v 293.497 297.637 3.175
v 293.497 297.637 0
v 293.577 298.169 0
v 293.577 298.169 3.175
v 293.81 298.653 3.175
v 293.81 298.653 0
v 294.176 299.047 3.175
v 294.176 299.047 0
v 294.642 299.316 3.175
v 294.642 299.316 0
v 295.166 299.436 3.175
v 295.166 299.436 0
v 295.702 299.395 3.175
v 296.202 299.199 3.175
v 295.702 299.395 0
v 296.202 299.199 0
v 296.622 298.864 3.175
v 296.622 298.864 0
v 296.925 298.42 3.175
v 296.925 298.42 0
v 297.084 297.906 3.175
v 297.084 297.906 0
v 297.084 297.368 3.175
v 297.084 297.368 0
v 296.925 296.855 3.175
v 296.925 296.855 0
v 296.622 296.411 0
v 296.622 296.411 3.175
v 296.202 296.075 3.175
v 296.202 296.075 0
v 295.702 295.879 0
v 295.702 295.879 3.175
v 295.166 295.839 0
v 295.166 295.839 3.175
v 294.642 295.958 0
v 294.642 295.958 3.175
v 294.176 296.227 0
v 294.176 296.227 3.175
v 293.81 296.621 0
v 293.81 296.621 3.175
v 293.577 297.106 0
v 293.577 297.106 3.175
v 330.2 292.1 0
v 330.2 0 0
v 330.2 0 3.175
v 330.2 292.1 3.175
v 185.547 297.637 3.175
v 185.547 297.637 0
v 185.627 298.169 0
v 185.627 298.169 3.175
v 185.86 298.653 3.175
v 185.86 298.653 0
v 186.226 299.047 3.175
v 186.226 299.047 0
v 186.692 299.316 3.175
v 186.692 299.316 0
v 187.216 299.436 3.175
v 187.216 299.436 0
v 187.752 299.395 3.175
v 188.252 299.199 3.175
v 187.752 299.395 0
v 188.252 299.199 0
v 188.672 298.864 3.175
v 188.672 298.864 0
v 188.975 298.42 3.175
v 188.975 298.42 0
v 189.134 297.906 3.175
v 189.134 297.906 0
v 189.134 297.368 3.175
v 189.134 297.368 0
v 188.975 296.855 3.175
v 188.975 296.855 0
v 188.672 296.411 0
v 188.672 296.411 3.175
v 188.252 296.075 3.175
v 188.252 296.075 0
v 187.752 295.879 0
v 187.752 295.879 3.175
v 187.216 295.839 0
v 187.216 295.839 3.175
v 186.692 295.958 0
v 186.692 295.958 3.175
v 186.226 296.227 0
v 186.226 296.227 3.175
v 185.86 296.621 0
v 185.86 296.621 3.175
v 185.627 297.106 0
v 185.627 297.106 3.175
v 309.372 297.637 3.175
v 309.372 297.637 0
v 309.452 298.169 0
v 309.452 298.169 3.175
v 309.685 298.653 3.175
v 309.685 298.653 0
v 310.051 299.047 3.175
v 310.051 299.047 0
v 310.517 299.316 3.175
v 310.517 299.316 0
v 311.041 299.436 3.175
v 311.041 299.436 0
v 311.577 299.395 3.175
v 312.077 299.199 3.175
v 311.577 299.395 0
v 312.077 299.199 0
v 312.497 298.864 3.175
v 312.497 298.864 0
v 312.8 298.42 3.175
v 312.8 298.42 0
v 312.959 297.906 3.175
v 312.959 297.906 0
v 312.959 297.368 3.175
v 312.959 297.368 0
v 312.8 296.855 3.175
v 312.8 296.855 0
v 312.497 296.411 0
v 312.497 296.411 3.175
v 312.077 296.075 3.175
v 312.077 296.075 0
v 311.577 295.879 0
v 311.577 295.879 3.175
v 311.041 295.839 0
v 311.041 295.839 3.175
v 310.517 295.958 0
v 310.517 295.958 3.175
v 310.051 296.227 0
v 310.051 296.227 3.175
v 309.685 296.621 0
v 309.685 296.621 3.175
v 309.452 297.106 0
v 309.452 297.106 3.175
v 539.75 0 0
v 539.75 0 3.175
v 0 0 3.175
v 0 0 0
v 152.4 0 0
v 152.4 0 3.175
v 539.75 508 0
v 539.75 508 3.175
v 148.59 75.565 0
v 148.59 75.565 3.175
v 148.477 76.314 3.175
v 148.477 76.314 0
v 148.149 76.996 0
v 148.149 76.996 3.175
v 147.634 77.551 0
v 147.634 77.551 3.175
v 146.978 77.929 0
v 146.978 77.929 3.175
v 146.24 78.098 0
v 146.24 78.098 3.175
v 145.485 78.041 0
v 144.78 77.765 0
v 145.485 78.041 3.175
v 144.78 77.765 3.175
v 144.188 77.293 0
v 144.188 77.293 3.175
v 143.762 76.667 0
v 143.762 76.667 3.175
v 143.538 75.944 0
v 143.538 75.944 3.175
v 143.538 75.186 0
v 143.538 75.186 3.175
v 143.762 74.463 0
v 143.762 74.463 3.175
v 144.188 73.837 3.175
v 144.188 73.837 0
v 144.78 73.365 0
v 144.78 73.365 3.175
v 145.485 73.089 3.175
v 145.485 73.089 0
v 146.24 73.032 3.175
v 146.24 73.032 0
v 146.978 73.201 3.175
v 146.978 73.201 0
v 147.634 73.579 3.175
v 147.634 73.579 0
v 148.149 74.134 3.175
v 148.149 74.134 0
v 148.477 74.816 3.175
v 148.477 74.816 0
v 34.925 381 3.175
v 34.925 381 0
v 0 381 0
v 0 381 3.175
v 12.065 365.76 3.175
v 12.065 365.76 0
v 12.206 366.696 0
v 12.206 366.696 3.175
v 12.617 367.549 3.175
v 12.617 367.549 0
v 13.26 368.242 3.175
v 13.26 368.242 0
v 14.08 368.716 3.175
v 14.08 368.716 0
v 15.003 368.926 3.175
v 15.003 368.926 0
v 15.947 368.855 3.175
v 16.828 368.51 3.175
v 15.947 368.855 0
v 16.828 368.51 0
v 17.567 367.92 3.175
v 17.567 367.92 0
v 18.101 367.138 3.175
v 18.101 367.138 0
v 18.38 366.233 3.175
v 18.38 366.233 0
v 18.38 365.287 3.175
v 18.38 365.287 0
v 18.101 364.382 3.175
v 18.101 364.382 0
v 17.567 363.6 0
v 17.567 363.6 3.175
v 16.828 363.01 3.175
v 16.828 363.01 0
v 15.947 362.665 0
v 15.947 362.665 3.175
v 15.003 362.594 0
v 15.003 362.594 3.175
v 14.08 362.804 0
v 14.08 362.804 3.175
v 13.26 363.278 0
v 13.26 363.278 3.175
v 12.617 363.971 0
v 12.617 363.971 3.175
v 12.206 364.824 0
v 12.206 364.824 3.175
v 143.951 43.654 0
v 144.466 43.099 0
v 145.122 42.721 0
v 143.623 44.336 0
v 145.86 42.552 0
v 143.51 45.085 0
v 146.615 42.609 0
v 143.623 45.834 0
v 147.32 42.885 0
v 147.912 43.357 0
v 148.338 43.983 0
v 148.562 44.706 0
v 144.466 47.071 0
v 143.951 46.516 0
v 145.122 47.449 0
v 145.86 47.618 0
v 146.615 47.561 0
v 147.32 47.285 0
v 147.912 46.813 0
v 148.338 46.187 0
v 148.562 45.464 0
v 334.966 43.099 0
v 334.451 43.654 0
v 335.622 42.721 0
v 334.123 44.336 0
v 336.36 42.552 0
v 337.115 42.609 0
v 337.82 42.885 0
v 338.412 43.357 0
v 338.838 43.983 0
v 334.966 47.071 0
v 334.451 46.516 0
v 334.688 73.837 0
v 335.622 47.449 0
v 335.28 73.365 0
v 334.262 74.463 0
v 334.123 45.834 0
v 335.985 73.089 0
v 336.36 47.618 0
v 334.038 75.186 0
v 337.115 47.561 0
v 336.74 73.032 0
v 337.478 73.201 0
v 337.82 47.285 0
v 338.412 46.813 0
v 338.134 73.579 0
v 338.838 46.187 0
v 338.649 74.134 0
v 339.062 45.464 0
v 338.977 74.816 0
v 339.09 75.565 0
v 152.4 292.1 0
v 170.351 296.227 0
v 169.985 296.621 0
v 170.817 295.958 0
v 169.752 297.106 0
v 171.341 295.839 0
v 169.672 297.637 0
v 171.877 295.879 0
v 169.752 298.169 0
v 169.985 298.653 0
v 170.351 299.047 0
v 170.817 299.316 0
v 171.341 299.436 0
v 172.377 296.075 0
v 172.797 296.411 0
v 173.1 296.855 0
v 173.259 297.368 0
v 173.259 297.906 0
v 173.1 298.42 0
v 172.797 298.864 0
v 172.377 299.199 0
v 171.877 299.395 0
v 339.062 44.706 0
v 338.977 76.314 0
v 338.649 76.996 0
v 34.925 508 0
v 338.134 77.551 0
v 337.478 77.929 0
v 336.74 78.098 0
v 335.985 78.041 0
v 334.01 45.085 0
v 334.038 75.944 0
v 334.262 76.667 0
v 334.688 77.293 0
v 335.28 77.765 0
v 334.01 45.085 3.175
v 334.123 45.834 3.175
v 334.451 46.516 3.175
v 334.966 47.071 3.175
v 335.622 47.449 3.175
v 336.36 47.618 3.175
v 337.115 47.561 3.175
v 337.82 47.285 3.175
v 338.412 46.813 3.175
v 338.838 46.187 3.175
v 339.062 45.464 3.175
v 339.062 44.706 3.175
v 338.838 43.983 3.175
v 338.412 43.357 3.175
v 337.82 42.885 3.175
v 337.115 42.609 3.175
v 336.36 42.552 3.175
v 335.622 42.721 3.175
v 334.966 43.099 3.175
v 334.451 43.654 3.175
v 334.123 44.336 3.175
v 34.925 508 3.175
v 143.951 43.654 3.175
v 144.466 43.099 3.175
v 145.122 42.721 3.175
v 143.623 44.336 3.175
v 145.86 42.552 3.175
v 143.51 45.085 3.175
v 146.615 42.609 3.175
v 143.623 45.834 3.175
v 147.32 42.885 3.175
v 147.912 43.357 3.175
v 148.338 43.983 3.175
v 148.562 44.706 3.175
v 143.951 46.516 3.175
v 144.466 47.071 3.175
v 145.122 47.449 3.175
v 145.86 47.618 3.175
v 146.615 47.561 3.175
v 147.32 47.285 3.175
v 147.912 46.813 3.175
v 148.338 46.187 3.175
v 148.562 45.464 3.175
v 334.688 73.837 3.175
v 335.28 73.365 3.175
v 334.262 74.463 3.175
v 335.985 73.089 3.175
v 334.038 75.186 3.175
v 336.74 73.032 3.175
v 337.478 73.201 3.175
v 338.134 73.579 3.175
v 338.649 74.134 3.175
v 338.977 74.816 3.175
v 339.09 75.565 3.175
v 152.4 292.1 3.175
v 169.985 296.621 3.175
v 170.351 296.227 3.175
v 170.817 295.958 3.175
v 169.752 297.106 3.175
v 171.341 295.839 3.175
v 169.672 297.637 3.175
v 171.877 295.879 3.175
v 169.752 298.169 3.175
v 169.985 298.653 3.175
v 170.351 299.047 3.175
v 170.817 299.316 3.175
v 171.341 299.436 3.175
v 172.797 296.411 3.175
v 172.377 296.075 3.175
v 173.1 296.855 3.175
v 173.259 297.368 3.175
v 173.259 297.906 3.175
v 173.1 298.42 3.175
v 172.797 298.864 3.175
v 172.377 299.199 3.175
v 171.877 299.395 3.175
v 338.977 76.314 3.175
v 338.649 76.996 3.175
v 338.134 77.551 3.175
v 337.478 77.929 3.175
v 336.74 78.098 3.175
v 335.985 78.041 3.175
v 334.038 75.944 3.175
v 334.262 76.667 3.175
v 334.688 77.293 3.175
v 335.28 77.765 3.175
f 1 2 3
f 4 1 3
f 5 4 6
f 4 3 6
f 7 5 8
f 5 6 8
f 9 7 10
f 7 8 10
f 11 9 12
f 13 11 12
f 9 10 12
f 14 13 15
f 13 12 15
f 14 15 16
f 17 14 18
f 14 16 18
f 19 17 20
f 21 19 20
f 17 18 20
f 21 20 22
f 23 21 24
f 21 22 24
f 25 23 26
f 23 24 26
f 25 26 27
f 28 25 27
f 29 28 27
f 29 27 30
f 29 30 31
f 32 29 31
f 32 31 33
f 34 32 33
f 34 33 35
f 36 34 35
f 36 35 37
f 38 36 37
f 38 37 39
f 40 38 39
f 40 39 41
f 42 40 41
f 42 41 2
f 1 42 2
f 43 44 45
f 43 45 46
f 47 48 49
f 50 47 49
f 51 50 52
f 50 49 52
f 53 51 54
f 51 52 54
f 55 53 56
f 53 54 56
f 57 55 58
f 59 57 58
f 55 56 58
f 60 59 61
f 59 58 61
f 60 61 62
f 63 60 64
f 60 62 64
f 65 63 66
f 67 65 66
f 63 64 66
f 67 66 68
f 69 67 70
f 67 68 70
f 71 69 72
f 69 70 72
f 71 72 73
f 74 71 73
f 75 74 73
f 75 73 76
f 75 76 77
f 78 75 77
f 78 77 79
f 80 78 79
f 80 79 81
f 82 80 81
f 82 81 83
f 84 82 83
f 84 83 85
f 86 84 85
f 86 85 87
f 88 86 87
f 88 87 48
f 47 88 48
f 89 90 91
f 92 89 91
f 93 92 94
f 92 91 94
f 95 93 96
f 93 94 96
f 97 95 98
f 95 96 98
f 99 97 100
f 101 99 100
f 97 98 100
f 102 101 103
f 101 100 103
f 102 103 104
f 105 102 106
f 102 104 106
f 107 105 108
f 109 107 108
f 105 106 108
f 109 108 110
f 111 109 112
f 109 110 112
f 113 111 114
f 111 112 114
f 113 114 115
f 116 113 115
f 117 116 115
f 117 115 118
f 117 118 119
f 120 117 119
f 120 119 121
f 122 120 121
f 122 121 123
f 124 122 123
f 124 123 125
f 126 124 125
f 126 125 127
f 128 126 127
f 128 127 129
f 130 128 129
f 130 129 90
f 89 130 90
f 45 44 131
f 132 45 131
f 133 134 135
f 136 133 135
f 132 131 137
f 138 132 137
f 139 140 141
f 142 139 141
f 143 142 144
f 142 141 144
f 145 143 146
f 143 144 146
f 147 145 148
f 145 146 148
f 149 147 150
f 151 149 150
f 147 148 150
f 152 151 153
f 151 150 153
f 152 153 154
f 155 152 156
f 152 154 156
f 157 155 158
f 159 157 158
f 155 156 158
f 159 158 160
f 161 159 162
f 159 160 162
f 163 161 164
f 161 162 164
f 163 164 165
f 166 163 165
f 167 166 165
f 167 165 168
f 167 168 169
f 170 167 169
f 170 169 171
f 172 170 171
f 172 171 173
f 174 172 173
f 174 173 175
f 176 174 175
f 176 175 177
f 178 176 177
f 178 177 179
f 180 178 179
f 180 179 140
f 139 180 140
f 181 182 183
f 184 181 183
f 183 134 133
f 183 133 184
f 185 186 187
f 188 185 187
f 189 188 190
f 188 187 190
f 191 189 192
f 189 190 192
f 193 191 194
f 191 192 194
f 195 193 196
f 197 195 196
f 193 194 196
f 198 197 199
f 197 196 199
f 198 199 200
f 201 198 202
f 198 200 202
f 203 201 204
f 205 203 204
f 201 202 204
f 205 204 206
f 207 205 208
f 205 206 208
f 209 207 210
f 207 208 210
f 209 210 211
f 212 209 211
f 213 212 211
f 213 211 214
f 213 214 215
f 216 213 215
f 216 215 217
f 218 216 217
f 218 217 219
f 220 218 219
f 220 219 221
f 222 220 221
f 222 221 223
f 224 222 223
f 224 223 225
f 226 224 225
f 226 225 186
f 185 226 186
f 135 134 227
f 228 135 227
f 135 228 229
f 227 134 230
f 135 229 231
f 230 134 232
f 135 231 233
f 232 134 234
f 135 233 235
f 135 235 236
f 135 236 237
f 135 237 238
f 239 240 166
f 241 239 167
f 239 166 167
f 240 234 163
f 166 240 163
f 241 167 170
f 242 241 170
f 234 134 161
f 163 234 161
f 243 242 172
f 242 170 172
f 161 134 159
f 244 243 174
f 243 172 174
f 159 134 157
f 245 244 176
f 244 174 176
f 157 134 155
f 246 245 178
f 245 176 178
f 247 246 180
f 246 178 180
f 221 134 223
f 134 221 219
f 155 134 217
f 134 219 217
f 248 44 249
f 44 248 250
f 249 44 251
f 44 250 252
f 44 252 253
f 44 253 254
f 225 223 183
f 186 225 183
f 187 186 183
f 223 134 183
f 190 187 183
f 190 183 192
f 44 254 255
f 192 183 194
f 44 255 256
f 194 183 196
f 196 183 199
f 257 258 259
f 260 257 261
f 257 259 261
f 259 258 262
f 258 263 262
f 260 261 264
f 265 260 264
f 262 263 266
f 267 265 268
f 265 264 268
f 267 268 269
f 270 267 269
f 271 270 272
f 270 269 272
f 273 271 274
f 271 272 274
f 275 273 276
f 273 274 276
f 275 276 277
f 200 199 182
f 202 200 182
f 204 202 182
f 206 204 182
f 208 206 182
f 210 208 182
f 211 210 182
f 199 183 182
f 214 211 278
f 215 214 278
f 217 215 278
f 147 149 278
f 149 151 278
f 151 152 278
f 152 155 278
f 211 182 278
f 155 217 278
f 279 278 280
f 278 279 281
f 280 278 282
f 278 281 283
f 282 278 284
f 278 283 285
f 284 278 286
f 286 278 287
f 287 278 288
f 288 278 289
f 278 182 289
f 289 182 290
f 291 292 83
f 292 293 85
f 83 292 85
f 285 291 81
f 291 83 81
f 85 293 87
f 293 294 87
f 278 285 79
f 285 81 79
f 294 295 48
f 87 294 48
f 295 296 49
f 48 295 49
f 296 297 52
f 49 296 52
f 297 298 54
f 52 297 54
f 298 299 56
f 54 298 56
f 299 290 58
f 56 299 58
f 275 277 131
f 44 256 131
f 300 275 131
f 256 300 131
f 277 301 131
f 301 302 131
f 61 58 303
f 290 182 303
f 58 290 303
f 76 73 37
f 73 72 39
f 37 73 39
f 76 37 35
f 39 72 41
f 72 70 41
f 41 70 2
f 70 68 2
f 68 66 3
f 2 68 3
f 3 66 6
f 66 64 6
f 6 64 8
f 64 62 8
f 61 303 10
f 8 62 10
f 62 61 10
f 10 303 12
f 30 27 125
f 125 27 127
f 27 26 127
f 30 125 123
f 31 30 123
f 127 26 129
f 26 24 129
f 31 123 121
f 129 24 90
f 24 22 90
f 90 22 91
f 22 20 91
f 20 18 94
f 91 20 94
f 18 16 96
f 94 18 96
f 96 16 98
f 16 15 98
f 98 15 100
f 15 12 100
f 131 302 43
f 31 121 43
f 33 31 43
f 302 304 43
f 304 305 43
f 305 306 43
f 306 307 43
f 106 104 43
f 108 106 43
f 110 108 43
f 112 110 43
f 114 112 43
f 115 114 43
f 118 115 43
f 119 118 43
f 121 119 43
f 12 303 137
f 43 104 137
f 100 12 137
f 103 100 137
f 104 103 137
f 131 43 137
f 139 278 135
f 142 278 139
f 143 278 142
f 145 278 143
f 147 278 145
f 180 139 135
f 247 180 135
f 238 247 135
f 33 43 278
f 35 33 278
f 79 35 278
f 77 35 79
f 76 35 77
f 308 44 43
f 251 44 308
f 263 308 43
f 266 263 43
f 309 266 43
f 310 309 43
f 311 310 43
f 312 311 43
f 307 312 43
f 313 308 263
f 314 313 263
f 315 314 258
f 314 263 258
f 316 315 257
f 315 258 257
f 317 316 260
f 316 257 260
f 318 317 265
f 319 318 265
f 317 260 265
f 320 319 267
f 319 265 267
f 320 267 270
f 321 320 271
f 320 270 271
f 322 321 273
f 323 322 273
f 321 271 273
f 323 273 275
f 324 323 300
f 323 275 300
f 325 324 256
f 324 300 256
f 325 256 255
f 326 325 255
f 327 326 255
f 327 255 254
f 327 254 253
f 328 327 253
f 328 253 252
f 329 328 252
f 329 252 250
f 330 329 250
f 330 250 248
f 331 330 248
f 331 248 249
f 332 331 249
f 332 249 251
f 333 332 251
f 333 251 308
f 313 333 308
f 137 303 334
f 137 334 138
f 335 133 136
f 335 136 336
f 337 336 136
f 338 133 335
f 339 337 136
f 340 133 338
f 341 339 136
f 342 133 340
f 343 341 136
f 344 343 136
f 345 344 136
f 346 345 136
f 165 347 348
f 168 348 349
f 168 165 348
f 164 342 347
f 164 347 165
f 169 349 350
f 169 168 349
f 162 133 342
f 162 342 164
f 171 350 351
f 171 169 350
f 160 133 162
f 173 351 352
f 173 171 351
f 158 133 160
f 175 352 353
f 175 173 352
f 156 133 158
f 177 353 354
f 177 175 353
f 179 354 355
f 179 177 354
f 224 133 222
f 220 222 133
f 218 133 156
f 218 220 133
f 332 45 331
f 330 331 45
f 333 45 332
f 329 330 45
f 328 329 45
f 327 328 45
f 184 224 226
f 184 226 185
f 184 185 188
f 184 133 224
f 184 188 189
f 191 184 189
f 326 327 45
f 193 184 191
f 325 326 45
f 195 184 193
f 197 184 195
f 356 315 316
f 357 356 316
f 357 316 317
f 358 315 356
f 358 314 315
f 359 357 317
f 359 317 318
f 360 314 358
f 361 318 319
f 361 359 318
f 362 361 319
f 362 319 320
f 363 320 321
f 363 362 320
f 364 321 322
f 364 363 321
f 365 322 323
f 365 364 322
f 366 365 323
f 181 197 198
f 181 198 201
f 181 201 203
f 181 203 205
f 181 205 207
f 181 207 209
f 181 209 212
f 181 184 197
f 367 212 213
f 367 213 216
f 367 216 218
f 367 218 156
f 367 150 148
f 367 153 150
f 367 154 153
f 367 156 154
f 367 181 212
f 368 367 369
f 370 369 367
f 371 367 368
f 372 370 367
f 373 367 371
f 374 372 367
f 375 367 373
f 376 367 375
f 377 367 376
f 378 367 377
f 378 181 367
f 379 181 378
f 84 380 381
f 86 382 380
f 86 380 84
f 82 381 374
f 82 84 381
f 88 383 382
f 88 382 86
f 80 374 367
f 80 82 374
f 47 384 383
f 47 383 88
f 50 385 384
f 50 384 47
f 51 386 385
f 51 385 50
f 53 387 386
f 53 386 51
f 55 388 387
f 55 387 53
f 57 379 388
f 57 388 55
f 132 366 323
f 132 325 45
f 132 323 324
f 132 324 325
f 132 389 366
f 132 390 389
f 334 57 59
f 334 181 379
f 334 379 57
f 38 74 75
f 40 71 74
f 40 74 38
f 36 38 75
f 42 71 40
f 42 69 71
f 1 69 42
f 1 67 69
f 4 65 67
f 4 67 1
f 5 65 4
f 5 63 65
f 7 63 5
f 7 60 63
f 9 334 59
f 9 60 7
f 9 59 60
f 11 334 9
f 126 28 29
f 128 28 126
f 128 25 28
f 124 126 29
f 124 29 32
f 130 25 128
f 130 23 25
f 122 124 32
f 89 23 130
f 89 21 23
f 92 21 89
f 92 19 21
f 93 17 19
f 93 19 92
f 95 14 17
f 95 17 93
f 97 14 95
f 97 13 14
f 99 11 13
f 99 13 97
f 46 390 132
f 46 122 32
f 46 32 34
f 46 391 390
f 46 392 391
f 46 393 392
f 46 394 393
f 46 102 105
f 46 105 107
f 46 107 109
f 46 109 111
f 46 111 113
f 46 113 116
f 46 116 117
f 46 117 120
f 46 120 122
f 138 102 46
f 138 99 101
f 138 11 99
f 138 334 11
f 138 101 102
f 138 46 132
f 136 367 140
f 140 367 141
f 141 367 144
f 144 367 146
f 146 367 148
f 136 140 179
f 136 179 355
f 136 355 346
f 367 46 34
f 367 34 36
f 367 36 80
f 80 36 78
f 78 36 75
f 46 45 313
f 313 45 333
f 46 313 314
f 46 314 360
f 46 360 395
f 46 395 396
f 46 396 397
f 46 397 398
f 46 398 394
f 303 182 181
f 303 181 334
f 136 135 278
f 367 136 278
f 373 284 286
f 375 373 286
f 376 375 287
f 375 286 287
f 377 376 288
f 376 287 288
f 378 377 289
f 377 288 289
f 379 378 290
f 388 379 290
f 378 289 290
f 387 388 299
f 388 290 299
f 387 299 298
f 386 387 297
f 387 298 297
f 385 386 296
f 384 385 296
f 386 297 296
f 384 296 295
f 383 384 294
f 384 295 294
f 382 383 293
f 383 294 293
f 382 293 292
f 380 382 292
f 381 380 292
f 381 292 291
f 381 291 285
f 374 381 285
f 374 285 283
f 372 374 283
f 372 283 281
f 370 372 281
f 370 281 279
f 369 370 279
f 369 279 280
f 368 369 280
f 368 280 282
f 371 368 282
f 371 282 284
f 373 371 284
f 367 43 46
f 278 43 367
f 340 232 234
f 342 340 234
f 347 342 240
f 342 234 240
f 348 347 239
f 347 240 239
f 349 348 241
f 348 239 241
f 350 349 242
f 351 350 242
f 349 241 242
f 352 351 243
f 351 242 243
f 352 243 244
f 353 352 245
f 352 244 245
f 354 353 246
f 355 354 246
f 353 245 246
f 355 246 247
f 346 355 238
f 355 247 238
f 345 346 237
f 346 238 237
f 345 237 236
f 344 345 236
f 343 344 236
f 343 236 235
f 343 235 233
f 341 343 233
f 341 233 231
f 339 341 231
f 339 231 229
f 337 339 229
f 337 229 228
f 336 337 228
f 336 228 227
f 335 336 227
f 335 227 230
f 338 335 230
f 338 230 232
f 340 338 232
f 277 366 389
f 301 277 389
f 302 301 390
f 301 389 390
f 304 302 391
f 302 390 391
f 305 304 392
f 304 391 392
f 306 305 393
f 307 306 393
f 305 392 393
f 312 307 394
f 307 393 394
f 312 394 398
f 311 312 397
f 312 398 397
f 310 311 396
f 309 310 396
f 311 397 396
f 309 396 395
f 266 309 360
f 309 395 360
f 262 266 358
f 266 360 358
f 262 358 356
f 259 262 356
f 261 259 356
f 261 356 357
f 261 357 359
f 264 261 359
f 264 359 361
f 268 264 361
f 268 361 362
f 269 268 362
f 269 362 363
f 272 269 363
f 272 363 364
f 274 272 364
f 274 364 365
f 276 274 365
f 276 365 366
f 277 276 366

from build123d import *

# Parameters (mm, degrees)
SKETCH1_W           = 539.75
SKETCH1_H           = 508
BOSS_EXTRUDE1_DEPTH = 3.175
SKETCH2_R           = 2.54
SKETCH2_R_2         = 3.175
SKETCH2_W           = 177.8
SKETCH2_H           = 292.1
CUT_EXTRUDE1_DEPTH  = 44.45
SKETCH3_W           = 34.925
SKETCH3_H           = 127
CUT_EXTRUDE2_DEPTH  = 742.218013222
SKETCH4_R           = 1.8034
CUT_EXTRUDE3_DEPTH  = 742.218013222
SKETCH5_R           = 2.54
CUT_EXTRUDE4_DEPTH  = 742.218013222
SKETCH6_R           = 2.54
CUT_EXTRUDE5_DEPTH  = 742.218013222


with BuildPart() as part:
    # Sketch1 → Boss-Extrude1 (new body)
    with BuildSketch(Plane.XY):
        with Locations((269.875, 254)):
            Rectangle(SKETCH1_W, SKETCH1_H)
    extrude(amount=BOSS_EXTRUDE1_DEPTH)

    # Sketch2 → Cut-Extrude1 (cut)
    with BuildSketch(Plane(origin=(0, 0, 0), x_dir=(-1, 0, 0), z_dir=(0, 0, -1))):
        with Locations((-336.55, 45.085)):
            Circle(SKETCH2_R)
        with Locations((-146.05, 45.085)):
            Circle(SKETCH2_R)
        with Locations((-15.24, 365.76)):
            Circle(SKETCH2_R_2)
        with Locations((-241.3, 146.05)):
            Rectangle(SKETCH2_W, SKETCH2_H)
    extrude(amount=-CUT_EXTRUDE1_DEPTH, mode=Mode.SUBTRACT)

    # Sketch3 → Cut-Extrude2 (cut, through all)
    with BuildSketch(Plane(origin=(0, 0, 0), x_dir=(-1, 0, 0), z_dir=(0, 0, -1))):
        with Locations((-17.4625, 444.5)):
            Rectangle(SKETCH3_W, SKETCH3_H)
    extrude(amount=-CUT_EXTRUDE2_DEPTH, mode=Mode.SUBTRACT)

    # Sketch4 → Cut-Extrude3 (cut, through all)
    with BuildSketch(Plane(origin=(0, 0, 0), x_dir=(-1, 0, 0), z_dir=(0, 0, -1))):
        with Locations((-311.1754, 297.6372)):
            Circle(SKETCH4_R)
        with Locations((-295.3004, 297.6372)):
            Circle(SKETCH4_R)
        with Locations((-187.3504, 297.6372)):
            Circle(SKETCH4_R)
        with Locations((-171.4754, 297.6372)):
            Circle(SKETCH4_R)
    extrude(amount=-CUT_EXTRUDE3_DEPTH, mode=Mode.SUBTRACT)

    # Sketch5 → Cut-Extrude4 (cut, through all)
    with BuildSketch(Plane.XY.offset(3.175)):
        with Locations((146.05, 75.565)):
            Circle(SKETCH5_R)
    extrude(amount=-CUT_EXTRUDE4_DEPTH, mode=Mode.SUBTRACT)

    # Sketch6 → Cut-Extrude5 (cut, through all)
    with BuildSketch(Plane.XY.offset(3.175)):
        with Locations((336.55, 75.565)):
            Circle(SKETCH6_R)
    extrude(amount=-CUT_EXTRUDE5_DEPTH, mode=Mode.SUBTRACT)


solid = part.part
